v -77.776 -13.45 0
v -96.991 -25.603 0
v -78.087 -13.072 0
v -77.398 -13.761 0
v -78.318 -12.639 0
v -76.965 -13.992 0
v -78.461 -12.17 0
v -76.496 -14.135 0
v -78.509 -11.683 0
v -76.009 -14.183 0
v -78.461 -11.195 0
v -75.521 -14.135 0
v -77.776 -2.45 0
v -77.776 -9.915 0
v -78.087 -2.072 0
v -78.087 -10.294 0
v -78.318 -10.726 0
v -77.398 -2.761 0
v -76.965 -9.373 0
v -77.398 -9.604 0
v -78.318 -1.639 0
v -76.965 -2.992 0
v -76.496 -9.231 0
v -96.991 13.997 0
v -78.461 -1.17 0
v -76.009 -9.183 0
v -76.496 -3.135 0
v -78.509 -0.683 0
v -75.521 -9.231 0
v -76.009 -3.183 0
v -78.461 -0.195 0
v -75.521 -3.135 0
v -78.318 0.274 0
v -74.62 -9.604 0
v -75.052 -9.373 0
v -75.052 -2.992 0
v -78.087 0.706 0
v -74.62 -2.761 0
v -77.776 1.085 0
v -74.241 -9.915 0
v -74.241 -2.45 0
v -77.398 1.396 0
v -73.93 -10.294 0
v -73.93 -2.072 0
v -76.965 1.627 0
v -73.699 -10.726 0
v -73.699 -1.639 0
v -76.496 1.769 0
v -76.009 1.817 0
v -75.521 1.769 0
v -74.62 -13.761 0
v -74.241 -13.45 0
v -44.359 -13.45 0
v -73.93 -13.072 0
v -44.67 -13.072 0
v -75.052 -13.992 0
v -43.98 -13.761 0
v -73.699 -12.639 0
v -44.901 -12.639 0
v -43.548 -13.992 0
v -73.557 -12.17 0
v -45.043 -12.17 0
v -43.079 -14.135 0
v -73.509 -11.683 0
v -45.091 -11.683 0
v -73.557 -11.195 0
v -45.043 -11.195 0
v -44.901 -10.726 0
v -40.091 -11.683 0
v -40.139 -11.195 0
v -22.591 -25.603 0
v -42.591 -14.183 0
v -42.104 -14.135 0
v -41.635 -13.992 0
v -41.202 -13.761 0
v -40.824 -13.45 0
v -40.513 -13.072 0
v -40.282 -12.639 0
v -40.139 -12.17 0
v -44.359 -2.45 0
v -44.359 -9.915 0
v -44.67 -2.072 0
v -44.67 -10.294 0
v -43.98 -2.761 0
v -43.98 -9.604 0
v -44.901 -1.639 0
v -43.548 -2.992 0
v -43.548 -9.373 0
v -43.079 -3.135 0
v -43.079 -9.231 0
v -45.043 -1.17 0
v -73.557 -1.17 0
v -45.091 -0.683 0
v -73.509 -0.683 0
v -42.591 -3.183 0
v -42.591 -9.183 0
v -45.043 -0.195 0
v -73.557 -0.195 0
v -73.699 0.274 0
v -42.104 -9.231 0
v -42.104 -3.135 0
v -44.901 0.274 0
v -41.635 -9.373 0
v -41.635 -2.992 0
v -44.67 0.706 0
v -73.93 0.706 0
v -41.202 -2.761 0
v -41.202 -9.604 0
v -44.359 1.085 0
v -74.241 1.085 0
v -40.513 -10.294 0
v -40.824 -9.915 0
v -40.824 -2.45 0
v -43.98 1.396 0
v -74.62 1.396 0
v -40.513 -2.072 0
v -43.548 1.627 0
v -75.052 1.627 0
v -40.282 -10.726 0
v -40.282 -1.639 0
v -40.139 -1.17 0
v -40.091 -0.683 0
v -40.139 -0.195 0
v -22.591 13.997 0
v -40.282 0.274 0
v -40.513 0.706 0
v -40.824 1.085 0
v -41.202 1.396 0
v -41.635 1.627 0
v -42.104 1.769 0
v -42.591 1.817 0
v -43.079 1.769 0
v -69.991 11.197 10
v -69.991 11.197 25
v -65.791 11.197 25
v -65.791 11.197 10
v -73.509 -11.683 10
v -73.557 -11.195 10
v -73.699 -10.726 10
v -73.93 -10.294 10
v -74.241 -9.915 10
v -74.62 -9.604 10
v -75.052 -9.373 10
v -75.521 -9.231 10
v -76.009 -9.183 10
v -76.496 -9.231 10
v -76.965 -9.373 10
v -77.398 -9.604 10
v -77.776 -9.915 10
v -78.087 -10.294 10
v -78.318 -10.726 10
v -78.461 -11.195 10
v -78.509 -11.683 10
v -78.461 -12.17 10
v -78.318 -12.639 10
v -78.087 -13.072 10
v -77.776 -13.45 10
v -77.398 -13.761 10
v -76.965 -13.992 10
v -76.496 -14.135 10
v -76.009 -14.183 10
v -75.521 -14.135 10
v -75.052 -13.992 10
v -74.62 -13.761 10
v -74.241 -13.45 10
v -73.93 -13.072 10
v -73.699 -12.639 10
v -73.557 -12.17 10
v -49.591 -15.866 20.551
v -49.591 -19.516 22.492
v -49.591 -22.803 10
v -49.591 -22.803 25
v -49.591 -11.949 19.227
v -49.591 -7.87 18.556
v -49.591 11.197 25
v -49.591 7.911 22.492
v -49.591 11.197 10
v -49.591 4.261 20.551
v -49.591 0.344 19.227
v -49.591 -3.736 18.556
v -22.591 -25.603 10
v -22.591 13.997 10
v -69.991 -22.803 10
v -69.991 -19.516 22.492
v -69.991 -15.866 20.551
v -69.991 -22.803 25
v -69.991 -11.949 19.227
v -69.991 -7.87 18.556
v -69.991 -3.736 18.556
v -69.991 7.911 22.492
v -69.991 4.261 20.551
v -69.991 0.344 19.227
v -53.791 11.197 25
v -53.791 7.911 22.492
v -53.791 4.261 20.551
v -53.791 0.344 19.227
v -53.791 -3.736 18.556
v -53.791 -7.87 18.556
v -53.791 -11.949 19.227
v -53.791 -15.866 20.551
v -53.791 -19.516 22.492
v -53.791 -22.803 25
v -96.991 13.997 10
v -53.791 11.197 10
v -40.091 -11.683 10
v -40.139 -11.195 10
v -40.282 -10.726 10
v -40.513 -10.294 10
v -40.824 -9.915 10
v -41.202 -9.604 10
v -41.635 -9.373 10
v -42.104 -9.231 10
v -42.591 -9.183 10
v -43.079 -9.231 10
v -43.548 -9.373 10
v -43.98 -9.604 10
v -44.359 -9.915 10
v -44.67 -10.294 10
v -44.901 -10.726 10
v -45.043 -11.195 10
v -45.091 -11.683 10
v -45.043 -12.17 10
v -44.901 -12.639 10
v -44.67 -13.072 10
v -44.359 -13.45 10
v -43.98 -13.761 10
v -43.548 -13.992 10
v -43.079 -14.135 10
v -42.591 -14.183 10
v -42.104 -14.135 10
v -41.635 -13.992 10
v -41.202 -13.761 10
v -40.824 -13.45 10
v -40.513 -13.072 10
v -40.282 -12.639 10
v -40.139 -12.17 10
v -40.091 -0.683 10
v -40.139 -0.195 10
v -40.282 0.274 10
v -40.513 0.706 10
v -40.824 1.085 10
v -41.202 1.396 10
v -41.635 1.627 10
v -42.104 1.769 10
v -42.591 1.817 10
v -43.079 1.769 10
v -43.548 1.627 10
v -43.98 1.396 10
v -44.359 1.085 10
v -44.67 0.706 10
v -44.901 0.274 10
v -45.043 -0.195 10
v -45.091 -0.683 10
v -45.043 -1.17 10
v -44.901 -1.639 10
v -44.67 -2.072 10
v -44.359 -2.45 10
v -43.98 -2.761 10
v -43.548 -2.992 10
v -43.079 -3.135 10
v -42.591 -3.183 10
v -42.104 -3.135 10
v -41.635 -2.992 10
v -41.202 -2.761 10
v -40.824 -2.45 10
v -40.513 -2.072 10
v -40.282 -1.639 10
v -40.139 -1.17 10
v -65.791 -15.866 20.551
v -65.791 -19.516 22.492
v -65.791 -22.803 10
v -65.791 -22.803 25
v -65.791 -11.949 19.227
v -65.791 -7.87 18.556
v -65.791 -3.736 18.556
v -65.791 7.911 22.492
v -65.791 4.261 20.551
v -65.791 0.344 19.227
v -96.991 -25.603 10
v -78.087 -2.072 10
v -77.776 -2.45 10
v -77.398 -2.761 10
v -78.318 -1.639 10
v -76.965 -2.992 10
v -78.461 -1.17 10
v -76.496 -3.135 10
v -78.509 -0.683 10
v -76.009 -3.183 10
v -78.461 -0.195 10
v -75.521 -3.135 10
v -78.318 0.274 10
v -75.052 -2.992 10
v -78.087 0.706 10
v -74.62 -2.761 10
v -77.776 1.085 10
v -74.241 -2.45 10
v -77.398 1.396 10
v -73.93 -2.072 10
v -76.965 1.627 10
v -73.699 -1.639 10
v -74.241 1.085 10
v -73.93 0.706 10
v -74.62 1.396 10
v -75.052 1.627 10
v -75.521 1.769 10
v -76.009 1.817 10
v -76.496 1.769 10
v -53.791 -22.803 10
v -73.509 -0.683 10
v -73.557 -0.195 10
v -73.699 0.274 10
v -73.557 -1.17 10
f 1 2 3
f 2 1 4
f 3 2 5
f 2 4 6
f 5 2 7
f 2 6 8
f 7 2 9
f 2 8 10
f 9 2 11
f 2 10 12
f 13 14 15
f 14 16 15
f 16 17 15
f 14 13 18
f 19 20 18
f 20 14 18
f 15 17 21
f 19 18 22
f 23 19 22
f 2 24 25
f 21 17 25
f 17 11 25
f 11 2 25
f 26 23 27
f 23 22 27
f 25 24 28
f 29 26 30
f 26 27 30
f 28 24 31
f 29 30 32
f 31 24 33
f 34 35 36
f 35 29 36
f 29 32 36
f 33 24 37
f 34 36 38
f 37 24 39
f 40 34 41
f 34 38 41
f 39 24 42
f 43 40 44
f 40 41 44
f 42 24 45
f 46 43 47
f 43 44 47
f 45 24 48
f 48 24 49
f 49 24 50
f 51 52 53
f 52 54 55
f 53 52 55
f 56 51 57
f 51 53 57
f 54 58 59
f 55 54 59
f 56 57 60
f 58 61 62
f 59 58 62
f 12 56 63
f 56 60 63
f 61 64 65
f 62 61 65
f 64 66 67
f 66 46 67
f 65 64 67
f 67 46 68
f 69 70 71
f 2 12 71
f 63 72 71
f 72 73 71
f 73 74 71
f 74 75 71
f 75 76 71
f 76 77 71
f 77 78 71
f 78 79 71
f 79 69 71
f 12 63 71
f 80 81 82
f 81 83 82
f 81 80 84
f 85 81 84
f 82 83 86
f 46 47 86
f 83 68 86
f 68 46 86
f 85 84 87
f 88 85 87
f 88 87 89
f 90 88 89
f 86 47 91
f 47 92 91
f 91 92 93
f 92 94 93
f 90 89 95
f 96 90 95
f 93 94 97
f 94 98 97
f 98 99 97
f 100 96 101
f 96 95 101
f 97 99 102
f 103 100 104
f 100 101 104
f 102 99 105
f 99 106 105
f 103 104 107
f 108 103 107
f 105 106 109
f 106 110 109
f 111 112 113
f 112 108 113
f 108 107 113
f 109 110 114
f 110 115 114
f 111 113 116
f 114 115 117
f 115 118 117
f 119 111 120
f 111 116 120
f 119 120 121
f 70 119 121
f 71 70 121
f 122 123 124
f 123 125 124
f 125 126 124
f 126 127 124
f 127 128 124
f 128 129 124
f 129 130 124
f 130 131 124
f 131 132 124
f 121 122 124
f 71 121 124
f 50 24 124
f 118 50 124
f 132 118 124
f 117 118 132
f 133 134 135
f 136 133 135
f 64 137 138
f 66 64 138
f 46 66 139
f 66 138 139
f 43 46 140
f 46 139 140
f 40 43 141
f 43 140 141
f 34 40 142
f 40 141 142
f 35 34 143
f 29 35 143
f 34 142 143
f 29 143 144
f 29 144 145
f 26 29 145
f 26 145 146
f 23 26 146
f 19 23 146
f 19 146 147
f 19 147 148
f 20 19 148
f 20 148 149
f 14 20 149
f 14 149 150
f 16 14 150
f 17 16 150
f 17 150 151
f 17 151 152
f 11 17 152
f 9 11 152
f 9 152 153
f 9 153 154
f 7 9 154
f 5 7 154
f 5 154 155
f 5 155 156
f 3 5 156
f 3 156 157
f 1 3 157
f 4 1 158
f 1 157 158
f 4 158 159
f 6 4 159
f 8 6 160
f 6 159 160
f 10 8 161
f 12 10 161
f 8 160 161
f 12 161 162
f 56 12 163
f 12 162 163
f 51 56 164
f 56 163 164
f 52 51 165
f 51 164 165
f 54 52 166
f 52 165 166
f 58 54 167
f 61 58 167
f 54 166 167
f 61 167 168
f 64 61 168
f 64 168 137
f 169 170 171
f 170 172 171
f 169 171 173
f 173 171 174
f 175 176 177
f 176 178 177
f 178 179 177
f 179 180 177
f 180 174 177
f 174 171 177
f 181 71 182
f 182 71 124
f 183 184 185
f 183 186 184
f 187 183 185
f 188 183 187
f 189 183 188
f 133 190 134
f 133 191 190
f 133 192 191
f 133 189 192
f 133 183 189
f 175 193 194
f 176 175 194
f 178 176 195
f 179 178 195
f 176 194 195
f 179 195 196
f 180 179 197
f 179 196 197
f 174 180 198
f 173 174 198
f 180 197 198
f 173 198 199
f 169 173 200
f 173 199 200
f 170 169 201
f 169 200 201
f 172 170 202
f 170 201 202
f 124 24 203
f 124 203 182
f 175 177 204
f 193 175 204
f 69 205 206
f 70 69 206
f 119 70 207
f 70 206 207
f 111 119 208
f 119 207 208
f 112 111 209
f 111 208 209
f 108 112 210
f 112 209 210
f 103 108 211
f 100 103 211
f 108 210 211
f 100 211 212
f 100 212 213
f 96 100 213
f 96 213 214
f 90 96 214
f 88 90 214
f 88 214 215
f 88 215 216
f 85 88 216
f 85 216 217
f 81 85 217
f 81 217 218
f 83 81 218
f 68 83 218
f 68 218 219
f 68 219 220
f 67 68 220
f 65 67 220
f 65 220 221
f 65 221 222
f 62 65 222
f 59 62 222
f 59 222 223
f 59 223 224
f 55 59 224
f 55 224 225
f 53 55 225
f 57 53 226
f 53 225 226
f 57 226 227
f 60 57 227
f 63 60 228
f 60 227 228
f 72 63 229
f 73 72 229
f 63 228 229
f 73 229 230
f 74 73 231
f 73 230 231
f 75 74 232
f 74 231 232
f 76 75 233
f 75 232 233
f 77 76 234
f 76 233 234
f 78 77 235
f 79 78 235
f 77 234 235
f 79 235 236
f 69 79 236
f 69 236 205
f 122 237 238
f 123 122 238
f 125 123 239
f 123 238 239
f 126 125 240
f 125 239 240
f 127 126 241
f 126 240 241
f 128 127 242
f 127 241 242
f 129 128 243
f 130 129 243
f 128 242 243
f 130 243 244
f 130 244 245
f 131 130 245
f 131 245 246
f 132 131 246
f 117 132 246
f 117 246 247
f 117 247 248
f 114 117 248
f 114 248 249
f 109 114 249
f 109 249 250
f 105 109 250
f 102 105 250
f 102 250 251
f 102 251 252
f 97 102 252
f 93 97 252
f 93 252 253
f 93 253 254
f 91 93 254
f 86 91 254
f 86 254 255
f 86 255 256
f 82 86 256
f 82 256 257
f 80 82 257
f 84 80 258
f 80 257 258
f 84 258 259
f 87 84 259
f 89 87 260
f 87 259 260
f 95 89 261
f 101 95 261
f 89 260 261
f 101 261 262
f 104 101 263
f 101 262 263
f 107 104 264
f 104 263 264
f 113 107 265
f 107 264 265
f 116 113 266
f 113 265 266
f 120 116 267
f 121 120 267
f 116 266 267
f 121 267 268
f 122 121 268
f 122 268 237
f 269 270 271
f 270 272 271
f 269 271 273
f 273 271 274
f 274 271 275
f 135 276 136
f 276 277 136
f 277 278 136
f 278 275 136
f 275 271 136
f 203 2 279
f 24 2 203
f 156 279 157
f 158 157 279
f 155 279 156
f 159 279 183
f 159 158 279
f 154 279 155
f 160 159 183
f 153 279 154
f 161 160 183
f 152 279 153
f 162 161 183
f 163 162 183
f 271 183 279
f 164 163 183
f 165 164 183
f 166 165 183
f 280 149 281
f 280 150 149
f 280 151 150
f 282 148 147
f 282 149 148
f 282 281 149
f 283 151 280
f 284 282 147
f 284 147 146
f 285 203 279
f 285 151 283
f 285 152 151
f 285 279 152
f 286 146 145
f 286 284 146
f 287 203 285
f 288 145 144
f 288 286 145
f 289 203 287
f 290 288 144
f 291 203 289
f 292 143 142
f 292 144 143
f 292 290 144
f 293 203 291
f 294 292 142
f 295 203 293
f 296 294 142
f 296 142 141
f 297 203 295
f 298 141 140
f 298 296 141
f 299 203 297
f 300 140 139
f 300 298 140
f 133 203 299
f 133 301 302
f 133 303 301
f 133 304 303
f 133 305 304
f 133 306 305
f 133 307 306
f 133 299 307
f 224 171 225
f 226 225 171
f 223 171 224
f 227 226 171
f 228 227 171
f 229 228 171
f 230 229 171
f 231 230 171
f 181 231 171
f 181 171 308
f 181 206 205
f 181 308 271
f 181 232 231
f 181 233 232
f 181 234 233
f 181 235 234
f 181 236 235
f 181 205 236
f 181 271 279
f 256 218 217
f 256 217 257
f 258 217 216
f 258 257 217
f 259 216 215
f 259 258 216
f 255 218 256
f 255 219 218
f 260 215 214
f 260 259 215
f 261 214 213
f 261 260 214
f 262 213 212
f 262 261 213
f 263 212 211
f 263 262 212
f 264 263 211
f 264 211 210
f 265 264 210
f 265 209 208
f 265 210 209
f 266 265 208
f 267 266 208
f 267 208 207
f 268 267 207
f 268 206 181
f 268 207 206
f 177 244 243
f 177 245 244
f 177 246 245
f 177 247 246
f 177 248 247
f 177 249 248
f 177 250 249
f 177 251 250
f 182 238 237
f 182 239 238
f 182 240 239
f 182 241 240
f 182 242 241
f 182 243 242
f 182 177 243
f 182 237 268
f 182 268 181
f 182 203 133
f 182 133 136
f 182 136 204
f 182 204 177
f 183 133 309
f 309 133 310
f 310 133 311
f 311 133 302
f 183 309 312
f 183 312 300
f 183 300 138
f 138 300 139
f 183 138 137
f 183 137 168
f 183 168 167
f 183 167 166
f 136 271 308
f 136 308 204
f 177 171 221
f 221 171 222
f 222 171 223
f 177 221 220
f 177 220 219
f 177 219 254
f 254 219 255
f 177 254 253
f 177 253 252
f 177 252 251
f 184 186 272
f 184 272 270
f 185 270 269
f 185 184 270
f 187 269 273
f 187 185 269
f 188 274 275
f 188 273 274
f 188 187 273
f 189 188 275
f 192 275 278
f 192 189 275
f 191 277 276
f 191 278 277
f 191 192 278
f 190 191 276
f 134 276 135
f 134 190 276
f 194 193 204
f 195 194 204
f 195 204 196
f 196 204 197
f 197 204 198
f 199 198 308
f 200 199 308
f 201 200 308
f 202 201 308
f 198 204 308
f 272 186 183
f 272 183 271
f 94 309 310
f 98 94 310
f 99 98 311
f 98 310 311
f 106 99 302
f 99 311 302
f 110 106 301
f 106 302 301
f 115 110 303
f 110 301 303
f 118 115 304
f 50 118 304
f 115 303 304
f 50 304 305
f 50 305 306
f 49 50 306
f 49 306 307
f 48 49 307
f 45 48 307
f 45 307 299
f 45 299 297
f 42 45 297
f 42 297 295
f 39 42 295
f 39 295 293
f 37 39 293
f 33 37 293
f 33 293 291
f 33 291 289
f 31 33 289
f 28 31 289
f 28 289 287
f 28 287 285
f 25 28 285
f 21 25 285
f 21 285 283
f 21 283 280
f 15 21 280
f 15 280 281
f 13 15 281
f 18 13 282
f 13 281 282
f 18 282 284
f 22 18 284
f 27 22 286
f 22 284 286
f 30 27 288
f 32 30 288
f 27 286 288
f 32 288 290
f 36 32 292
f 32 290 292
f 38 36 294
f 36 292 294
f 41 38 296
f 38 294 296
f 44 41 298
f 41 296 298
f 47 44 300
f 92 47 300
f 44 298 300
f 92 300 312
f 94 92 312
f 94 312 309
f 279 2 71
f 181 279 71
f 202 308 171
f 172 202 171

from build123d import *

# Parameters (mm, degrees)
SKETCH1_W                = 74.4
SKETCH1_H                = 39.6
BOSS_EXTRUDE4_DEPTH      = 10
SKETCH4_W                = 4.2
SKETCH4_H                = 34
BOSS_EXTRUDE7_DEPTH      = 15
CUT_EXTRUDE6_DEPTH       = 60.390731662
CUT_EXTRUDE6_DEPTH_BACK  = 8
CUT_EXTRUDE12_DEPTH      = 57.095802048
CUT_EXTRUDE12_DEPTH_BACK = 15
SKETCH7_R                = 2.5
CUT_EXTRUDE13_DEPTH      = 15


with BuildPart() as part:
    # Sketch1 → Boss-Extrude4 (new body)
    with BuildSketch(Plane.XY):
        with Locations((-59.791289062, -5.802714844)):
            Rectangle(SKETCH1_W, SKETCH1_H)
    extrude(amount=BOSS_EXTRUDE4_DEPTH)

    # Sketch4 → Boss-Extrude7 (add)
    with BuildSketch(Plane.XY.offset(10)):
        with Locations((-67.891289062, -5.802714844)):
            Rectangle(SKETCH4_W, SKETCH4_H)
        Polygon((-49.591289063, 11.197285156), (-53.791289062, 11.197285156), (-53.791289062, -22.802714844), (-49.591289063, -22.802714844), align=None)
    extrude(amount=BOSS_EXTRUDE7_DEPTH)

    # Sketch5 → Cut-Extrude6 (cut, two sides: drawn at the far end of the back side and taken through both)
    with BuildSketch(Plane(origin=(-49.591289063, 0, 0), x_dir=(0, 0, -1), z_dir=(1, 0, 0)).offset(-CUT_EXTRUDE6_DEPTH_BACK)):
        with BuildLine():
            Line((-91.244649925, 84.737426344), (-25, 11.197285156))
            ThreePointArc((-25, 11.197285156), (-18.472201779, -5.802714844), (-25, -22.802714844))
            Line((-25, -22.802714844), (-91.244649925, -96.342856031))
            Line((-91.244649925, -96.342856031), (-289.199250877, -96.342856031))
            Line((-289.199250877, -96.342856031), (-289.199250877, 84.737426344))
            Line((-289.199250877, 84.737426344), (-91.244649925, 84.737426344))
        make_face()
    extrude(amount=CUT_EXTRUDE6_DEPTH + CUT_EXTRUDE6_DEPTH_BACK, mode=Mode.SUBTRACT)

    # Sketch6 → Cut-Extrude12 (cut, two sides: drawn at the far end of the back side and taken through both)
    with BuildSketch(Plane(origin=(-65.791289062, 0, 0), x_dir=(0, 0, -1), z_dir=(1, 0, 0)).offset(-CUT_EXTRUDE12_DEPTH_BACK)):
        with BuildLine():
            Line((-91.244649925, -96.342856031), (-25, -22.802714844))
            ThreePointArc((-25, -22.802714844), (-18.472201779, -5.802714844), (-25, 11.197285156))
            Line((-25, 11.197285156), (-91.244649925, 84.737426344))
            Line((-91.244649925, 84.737426344), (-289.199250877, 84.737426344))
            Line((-289.199250877, 84.737426344), (-289.199250877, -96.342856031))
            Line((-289.199250877, -96.342856031), (-91.244649925, -96.342856031))
        make_face()
    extrude(amount=CUT_EXTRUDE12_DEPTH + CUT_EXTRUDE12_DEPTH_BACK, mode=Mode.SUBTRACT)

    # Sketch7 → Cut-Extrude13 (cut)
    with BuildSketch(Plane.XY.offset(10)):
        with Locations((-42.591289062, -11.682714844)):
            Circle(SKETCH7_R)
        with Locations((-42.591289062, -0.682714844)):
            Circle(SKETCH7_R)
        with Locations((-76.008712531, -0.682714844)):
            Circle(SKETCH7_R)
        with Locations((-76.008712531, -11.682714844)):
            Circle(SKETCH7_R)
    extrude(amount=-CUT_EXTRUDE13_DEPTH, mode=Mode.SUBTRACT)


solid = part.part
